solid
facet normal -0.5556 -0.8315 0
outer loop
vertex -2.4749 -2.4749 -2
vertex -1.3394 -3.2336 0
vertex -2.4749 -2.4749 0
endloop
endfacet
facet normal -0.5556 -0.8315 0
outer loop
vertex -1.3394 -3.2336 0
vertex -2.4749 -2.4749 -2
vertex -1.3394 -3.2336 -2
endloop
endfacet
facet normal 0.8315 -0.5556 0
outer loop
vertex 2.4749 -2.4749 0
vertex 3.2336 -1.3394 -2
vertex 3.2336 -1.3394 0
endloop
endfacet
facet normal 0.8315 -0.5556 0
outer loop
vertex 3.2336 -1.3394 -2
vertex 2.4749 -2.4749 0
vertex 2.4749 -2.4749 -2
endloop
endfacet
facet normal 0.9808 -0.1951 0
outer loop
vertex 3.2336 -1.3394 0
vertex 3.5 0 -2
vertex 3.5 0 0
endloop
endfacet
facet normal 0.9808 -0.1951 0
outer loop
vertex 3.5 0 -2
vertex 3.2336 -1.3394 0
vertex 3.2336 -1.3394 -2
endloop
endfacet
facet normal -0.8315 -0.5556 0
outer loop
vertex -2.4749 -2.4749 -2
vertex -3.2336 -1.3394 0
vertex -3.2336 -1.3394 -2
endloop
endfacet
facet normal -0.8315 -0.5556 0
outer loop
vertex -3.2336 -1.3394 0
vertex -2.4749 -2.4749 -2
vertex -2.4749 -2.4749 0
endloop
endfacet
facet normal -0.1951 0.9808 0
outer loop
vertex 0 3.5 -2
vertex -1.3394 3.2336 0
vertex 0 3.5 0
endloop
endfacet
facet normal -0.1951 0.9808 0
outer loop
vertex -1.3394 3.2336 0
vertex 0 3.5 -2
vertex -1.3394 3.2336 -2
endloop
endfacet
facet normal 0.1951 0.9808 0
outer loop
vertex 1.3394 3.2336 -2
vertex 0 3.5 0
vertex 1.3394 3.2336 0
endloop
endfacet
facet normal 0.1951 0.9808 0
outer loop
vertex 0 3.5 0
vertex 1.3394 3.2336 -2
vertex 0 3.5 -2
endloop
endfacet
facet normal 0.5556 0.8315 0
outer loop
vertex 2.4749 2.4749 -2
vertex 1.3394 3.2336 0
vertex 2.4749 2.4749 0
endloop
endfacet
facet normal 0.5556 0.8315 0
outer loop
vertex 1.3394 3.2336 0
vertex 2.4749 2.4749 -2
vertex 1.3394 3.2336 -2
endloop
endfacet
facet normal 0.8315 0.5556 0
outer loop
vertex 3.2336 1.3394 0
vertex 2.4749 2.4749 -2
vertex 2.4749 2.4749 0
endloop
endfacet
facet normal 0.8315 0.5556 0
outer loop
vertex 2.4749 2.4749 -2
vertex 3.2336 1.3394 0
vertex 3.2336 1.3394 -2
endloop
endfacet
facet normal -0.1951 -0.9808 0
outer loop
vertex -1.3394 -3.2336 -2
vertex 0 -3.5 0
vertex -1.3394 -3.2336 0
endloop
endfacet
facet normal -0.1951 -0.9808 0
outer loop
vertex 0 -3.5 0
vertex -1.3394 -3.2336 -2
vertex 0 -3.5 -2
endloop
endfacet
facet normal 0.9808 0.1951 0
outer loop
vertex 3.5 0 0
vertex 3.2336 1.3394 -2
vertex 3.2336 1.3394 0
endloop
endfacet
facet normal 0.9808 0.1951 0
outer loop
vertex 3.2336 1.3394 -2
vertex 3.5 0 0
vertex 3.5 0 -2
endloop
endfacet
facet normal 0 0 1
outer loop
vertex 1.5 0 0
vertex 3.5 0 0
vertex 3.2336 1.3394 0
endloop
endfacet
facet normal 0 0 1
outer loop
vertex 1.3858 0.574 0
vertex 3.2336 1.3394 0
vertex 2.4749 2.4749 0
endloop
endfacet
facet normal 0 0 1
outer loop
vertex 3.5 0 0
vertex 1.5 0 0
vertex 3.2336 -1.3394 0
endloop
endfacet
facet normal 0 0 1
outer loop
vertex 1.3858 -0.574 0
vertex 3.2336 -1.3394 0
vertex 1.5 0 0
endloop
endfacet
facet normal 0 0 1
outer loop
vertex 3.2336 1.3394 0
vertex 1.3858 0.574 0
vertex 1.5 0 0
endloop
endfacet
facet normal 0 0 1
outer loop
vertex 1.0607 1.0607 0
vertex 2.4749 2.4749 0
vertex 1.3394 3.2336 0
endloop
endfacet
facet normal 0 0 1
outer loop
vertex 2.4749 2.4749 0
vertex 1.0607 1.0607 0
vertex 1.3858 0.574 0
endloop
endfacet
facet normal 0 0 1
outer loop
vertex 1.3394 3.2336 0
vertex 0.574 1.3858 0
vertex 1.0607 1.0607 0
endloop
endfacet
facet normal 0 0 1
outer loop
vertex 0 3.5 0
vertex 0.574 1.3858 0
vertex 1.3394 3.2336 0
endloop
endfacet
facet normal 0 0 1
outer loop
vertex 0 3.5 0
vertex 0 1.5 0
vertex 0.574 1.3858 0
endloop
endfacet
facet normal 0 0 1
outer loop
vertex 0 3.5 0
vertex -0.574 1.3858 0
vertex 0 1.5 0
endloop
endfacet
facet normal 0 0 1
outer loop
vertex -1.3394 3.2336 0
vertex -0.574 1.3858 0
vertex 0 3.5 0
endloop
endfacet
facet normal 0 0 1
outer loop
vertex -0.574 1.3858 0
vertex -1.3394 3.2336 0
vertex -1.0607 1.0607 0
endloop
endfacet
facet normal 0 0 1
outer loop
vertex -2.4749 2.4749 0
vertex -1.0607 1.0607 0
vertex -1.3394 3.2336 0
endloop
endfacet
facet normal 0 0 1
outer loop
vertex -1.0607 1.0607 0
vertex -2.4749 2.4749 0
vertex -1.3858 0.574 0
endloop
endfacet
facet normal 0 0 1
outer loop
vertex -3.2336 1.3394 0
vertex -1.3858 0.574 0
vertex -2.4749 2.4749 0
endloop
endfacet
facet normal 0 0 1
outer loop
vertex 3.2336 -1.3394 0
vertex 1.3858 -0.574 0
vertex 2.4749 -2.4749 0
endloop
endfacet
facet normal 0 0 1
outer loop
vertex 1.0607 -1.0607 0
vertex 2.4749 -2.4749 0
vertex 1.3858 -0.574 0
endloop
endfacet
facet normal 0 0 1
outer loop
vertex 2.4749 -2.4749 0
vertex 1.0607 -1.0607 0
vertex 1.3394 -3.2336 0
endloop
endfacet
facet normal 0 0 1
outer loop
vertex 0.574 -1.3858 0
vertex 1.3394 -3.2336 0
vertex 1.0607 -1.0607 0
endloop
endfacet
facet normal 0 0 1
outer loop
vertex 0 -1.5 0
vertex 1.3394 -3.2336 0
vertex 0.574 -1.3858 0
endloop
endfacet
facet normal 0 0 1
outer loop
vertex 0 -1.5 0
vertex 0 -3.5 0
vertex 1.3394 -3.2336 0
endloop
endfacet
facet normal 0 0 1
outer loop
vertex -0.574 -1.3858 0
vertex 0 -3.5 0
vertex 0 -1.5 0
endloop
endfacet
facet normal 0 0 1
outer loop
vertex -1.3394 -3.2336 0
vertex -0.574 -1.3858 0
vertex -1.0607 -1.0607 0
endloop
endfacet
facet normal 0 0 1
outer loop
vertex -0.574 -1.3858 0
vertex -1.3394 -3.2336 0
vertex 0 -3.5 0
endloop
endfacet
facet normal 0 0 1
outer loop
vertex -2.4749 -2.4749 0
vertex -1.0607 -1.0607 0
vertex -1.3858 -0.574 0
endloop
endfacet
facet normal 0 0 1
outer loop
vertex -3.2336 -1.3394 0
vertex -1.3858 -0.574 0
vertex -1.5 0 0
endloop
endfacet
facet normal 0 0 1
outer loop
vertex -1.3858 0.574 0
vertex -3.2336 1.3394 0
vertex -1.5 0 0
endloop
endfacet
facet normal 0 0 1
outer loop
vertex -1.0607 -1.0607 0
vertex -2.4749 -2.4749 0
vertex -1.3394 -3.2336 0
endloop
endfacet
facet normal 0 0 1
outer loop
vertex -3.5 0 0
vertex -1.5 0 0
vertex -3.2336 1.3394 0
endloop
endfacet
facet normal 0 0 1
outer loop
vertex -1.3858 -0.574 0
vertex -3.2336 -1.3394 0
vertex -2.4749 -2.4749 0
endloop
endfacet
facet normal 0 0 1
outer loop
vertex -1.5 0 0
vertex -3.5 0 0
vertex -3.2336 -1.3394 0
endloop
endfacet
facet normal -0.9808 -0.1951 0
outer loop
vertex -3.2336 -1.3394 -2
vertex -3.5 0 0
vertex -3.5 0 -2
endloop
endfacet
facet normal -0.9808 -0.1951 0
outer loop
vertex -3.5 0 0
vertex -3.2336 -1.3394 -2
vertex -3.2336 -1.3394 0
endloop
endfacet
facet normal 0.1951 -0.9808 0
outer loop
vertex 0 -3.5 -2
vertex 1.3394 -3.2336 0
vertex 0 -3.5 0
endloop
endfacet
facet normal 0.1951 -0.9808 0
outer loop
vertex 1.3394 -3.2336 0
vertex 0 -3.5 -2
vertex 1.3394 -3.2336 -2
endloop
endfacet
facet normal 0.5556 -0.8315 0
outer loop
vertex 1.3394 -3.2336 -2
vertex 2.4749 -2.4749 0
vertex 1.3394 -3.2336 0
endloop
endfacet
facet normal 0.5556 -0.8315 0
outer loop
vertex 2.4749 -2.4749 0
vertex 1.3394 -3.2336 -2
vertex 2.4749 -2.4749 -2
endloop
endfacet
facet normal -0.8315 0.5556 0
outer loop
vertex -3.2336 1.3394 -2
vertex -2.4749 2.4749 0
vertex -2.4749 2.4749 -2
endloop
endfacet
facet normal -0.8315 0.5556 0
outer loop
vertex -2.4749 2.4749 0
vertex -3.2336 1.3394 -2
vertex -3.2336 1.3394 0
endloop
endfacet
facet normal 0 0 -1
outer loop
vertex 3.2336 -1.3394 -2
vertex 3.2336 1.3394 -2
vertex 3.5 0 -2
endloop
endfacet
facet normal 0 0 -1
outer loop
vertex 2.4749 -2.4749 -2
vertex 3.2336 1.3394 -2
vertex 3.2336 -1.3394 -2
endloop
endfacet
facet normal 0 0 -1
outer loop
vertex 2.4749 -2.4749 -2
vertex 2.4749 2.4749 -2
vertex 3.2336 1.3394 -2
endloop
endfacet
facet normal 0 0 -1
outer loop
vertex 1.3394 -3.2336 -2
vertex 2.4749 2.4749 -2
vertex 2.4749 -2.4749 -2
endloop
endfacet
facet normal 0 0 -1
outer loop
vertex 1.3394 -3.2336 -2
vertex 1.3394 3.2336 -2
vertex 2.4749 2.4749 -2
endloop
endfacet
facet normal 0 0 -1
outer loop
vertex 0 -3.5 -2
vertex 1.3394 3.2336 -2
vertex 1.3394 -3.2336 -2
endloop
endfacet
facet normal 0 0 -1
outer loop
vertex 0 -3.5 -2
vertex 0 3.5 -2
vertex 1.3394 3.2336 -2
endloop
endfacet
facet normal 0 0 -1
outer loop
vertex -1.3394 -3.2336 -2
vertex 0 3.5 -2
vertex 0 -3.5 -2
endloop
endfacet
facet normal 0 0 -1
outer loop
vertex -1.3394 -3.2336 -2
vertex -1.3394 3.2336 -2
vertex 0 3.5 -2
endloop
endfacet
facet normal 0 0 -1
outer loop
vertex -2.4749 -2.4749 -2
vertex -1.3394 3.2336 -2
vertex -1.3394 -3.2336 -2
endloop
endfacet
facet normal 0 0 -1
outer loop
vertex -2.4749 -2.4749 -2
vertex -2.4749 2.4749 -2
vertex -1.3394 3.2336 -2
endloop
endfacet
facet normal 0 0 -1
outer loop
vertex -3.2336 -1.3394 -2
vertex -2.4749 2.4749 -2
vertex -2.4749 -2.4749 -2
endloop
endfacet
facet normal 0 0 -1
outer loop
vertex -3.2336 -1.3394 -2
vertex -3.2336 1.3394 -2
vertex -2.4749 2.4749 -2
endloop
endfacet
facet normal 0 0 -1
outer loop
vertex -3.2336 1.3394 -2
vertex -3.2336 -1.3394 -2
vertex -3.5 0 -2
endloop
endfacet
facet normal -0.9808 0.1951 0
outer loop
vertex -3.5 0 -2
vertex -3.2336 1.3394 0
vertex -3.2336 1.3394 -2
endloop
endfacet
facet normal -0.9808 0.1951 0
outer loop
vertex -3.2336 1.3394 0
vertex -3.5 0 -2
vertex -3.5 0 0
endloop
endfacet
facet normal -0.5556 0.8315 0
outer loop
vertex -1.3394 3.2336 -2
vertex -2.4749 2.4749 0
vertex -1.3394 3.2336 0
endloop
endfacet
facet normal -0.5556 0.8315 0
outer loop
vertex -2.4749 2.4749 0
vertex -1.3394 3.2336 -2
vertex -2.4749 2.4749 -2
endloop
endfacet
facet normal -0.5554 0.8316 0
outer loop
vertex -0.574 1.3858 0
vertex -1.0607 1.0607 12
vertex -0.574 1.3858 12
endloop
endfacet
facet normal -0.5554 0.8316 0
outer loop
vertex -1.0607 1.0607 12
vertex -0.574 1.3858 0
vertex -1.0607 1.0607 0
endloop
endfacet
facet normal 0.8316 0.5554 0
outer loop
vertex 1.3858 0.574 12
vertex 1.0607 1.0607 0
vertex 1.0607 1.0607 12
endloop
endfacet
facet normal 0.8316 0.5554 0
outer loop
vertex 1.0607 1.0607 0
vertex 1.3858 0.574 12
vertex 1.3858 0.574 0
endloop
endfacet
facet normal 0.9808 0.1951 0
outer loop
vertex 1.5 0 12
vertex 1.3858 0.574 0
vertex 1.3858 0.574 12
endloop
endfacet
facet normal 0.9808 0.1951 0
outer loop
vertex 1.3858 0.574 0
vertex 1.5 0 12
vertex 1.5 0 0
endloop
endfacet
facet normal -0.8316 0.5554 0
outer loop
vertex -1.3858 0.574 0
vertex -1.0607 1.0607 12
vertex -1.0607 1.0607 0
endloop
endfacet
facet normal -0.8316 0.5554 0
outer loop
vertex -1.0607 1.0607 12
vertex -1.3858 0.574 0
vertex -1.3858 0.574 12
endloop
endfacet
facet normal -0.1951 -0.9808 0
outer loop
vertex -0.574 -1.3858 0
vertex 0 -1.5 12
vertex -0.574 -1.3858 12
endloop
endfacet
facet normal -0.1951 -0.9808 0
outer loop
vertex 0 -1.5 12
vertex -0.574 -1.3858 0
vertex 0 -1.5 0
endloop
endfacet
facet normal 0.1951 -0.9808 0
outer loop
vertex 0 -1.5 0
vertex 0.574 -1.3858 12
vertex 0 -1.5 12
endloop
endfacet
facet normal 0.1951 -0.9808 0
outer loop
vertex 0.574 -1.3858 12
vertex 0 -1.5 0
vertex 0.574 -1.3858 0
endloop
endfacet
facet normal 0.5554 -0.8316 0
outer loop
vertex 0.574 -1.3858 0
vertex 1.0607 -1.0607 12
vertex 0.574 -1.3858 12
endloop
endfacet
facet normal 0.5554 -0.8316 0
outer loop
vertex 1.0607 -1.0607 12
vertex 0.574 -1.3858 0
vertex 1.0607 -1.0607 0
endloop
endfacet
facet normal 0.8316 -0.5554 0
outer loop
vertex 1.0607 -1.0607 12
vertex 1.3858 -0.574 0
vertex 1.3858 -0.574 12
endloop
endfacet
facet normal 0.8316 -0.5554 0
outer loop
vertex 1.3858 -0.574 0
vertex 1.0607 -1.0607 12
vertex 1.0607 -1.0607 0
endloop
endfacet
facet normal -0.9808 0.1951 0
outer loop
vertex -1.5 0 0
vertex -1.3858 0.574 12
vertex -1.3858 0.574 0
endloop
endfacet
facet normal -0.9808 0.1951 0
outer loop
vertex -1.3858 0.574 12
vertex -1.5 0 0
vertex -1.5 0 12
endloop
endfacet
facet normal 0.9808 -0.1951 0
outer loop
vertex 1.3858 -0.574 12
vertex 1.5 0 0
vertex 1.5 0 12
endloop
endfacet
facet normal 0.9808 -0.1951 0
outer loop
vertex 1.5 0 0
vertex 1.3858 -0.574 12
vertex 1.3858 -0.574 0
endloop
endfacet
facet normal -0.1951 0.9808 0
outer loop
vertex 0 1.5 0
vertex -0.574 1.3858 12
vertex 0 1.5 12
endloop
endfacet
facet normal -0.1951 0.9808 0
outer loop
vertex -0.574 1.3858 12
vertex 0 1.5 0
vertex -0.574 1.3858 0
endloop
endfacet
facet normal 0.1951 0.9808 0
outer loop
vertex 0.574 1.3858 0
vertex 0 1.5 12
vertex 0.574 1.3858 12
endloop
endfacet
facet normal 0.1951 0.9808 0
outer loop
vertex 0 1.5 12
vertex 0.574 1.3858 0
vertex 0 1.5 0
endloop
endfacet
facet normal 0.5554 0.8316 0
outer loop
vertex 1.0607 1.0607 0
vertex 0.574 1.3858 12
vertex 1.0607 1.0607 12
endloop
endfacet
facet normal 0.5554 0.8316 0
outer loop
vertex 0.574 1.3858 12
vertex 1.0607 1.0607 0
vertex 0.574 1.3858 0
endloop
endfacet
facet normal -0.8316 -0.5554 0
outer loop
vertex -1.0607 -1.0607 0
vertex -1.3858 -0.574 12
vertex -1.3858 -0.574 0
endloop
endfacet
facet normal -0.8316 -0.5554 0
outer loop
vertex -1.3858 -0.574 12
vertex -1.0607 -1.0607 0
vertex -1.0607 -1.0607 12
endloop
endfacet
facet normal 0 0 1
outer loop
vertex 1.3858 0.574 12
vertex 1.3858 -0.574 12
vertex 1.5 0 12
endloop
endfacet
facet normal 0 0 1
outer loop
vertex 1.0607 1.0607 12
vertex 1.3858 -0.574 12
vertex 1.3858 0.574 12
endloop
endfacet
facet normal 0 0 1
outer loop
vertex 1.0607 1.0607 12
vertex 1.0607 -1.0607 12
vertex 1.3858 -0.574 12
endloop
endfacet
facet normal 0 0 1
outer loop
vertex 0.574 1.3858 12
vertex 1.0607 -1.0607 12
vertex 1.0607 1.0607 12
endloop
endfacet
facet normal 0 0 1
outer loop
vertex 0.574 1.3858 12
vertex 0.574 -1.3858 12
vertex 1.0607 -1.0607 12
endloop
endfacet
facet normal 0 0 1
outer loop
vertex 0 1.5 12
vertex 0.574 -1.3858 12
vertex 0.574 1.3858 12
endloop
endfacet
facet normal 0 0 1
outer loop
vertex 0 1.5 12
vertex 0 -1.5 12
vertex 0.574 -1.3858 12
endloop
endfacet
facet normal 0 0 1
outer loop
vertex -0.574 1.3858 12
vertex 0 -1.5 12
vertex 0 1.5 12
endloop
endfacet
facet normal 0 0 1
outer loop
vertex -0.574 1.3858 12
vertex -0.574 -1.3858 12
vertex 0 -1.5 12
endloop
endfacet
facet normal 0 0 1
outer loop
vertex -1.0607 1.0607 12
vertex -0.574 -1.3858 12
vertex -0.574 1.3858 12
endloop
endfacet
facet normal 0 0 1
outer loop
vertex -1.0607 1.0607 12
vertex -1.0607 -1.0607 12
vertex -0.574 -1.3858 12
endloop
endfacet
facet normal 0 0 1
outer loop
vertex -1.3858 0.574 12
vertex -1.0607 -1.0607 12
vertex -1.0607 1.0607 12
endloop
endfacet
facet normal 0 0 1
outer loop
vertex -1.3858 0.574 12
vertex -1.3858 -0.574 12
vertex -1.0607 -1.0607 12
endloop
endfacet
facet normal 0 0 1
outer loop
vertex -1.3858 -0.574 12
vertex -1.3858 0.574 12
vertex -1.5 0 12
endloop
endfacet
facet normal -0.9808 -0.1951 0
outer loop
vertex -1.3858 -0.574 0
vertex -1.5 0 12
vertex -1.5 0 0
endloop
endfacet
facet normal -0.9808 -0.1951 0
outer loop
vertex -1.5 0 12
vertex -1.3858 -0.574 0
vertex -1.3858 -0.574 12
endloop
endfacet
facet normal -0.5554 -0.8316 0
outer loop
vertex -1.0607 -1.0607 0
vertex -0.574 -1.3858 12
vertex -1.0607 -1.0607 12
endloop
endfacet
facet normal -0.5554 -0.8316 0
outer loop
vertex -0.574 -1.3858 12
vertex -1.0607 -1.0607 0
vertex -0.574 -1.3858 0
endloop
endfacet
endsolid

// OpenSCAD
$fn=16;

module chc_m3(length) {
	color("grey") union() {
		rotate([180,0,0]) cylinder(h=3,r=5.5/2,center=false);
		cylinder(h=length,r=1.5,center=false);
	}
}

module tbhc_m3(length) {
	color("grey") union() {
		rotate([180,0,0]) cylinder(h=2,r=7/2,center=false);
		cylinder(h=length,r=1.5,center=false);
	}
}

tbhc_m3(12);
